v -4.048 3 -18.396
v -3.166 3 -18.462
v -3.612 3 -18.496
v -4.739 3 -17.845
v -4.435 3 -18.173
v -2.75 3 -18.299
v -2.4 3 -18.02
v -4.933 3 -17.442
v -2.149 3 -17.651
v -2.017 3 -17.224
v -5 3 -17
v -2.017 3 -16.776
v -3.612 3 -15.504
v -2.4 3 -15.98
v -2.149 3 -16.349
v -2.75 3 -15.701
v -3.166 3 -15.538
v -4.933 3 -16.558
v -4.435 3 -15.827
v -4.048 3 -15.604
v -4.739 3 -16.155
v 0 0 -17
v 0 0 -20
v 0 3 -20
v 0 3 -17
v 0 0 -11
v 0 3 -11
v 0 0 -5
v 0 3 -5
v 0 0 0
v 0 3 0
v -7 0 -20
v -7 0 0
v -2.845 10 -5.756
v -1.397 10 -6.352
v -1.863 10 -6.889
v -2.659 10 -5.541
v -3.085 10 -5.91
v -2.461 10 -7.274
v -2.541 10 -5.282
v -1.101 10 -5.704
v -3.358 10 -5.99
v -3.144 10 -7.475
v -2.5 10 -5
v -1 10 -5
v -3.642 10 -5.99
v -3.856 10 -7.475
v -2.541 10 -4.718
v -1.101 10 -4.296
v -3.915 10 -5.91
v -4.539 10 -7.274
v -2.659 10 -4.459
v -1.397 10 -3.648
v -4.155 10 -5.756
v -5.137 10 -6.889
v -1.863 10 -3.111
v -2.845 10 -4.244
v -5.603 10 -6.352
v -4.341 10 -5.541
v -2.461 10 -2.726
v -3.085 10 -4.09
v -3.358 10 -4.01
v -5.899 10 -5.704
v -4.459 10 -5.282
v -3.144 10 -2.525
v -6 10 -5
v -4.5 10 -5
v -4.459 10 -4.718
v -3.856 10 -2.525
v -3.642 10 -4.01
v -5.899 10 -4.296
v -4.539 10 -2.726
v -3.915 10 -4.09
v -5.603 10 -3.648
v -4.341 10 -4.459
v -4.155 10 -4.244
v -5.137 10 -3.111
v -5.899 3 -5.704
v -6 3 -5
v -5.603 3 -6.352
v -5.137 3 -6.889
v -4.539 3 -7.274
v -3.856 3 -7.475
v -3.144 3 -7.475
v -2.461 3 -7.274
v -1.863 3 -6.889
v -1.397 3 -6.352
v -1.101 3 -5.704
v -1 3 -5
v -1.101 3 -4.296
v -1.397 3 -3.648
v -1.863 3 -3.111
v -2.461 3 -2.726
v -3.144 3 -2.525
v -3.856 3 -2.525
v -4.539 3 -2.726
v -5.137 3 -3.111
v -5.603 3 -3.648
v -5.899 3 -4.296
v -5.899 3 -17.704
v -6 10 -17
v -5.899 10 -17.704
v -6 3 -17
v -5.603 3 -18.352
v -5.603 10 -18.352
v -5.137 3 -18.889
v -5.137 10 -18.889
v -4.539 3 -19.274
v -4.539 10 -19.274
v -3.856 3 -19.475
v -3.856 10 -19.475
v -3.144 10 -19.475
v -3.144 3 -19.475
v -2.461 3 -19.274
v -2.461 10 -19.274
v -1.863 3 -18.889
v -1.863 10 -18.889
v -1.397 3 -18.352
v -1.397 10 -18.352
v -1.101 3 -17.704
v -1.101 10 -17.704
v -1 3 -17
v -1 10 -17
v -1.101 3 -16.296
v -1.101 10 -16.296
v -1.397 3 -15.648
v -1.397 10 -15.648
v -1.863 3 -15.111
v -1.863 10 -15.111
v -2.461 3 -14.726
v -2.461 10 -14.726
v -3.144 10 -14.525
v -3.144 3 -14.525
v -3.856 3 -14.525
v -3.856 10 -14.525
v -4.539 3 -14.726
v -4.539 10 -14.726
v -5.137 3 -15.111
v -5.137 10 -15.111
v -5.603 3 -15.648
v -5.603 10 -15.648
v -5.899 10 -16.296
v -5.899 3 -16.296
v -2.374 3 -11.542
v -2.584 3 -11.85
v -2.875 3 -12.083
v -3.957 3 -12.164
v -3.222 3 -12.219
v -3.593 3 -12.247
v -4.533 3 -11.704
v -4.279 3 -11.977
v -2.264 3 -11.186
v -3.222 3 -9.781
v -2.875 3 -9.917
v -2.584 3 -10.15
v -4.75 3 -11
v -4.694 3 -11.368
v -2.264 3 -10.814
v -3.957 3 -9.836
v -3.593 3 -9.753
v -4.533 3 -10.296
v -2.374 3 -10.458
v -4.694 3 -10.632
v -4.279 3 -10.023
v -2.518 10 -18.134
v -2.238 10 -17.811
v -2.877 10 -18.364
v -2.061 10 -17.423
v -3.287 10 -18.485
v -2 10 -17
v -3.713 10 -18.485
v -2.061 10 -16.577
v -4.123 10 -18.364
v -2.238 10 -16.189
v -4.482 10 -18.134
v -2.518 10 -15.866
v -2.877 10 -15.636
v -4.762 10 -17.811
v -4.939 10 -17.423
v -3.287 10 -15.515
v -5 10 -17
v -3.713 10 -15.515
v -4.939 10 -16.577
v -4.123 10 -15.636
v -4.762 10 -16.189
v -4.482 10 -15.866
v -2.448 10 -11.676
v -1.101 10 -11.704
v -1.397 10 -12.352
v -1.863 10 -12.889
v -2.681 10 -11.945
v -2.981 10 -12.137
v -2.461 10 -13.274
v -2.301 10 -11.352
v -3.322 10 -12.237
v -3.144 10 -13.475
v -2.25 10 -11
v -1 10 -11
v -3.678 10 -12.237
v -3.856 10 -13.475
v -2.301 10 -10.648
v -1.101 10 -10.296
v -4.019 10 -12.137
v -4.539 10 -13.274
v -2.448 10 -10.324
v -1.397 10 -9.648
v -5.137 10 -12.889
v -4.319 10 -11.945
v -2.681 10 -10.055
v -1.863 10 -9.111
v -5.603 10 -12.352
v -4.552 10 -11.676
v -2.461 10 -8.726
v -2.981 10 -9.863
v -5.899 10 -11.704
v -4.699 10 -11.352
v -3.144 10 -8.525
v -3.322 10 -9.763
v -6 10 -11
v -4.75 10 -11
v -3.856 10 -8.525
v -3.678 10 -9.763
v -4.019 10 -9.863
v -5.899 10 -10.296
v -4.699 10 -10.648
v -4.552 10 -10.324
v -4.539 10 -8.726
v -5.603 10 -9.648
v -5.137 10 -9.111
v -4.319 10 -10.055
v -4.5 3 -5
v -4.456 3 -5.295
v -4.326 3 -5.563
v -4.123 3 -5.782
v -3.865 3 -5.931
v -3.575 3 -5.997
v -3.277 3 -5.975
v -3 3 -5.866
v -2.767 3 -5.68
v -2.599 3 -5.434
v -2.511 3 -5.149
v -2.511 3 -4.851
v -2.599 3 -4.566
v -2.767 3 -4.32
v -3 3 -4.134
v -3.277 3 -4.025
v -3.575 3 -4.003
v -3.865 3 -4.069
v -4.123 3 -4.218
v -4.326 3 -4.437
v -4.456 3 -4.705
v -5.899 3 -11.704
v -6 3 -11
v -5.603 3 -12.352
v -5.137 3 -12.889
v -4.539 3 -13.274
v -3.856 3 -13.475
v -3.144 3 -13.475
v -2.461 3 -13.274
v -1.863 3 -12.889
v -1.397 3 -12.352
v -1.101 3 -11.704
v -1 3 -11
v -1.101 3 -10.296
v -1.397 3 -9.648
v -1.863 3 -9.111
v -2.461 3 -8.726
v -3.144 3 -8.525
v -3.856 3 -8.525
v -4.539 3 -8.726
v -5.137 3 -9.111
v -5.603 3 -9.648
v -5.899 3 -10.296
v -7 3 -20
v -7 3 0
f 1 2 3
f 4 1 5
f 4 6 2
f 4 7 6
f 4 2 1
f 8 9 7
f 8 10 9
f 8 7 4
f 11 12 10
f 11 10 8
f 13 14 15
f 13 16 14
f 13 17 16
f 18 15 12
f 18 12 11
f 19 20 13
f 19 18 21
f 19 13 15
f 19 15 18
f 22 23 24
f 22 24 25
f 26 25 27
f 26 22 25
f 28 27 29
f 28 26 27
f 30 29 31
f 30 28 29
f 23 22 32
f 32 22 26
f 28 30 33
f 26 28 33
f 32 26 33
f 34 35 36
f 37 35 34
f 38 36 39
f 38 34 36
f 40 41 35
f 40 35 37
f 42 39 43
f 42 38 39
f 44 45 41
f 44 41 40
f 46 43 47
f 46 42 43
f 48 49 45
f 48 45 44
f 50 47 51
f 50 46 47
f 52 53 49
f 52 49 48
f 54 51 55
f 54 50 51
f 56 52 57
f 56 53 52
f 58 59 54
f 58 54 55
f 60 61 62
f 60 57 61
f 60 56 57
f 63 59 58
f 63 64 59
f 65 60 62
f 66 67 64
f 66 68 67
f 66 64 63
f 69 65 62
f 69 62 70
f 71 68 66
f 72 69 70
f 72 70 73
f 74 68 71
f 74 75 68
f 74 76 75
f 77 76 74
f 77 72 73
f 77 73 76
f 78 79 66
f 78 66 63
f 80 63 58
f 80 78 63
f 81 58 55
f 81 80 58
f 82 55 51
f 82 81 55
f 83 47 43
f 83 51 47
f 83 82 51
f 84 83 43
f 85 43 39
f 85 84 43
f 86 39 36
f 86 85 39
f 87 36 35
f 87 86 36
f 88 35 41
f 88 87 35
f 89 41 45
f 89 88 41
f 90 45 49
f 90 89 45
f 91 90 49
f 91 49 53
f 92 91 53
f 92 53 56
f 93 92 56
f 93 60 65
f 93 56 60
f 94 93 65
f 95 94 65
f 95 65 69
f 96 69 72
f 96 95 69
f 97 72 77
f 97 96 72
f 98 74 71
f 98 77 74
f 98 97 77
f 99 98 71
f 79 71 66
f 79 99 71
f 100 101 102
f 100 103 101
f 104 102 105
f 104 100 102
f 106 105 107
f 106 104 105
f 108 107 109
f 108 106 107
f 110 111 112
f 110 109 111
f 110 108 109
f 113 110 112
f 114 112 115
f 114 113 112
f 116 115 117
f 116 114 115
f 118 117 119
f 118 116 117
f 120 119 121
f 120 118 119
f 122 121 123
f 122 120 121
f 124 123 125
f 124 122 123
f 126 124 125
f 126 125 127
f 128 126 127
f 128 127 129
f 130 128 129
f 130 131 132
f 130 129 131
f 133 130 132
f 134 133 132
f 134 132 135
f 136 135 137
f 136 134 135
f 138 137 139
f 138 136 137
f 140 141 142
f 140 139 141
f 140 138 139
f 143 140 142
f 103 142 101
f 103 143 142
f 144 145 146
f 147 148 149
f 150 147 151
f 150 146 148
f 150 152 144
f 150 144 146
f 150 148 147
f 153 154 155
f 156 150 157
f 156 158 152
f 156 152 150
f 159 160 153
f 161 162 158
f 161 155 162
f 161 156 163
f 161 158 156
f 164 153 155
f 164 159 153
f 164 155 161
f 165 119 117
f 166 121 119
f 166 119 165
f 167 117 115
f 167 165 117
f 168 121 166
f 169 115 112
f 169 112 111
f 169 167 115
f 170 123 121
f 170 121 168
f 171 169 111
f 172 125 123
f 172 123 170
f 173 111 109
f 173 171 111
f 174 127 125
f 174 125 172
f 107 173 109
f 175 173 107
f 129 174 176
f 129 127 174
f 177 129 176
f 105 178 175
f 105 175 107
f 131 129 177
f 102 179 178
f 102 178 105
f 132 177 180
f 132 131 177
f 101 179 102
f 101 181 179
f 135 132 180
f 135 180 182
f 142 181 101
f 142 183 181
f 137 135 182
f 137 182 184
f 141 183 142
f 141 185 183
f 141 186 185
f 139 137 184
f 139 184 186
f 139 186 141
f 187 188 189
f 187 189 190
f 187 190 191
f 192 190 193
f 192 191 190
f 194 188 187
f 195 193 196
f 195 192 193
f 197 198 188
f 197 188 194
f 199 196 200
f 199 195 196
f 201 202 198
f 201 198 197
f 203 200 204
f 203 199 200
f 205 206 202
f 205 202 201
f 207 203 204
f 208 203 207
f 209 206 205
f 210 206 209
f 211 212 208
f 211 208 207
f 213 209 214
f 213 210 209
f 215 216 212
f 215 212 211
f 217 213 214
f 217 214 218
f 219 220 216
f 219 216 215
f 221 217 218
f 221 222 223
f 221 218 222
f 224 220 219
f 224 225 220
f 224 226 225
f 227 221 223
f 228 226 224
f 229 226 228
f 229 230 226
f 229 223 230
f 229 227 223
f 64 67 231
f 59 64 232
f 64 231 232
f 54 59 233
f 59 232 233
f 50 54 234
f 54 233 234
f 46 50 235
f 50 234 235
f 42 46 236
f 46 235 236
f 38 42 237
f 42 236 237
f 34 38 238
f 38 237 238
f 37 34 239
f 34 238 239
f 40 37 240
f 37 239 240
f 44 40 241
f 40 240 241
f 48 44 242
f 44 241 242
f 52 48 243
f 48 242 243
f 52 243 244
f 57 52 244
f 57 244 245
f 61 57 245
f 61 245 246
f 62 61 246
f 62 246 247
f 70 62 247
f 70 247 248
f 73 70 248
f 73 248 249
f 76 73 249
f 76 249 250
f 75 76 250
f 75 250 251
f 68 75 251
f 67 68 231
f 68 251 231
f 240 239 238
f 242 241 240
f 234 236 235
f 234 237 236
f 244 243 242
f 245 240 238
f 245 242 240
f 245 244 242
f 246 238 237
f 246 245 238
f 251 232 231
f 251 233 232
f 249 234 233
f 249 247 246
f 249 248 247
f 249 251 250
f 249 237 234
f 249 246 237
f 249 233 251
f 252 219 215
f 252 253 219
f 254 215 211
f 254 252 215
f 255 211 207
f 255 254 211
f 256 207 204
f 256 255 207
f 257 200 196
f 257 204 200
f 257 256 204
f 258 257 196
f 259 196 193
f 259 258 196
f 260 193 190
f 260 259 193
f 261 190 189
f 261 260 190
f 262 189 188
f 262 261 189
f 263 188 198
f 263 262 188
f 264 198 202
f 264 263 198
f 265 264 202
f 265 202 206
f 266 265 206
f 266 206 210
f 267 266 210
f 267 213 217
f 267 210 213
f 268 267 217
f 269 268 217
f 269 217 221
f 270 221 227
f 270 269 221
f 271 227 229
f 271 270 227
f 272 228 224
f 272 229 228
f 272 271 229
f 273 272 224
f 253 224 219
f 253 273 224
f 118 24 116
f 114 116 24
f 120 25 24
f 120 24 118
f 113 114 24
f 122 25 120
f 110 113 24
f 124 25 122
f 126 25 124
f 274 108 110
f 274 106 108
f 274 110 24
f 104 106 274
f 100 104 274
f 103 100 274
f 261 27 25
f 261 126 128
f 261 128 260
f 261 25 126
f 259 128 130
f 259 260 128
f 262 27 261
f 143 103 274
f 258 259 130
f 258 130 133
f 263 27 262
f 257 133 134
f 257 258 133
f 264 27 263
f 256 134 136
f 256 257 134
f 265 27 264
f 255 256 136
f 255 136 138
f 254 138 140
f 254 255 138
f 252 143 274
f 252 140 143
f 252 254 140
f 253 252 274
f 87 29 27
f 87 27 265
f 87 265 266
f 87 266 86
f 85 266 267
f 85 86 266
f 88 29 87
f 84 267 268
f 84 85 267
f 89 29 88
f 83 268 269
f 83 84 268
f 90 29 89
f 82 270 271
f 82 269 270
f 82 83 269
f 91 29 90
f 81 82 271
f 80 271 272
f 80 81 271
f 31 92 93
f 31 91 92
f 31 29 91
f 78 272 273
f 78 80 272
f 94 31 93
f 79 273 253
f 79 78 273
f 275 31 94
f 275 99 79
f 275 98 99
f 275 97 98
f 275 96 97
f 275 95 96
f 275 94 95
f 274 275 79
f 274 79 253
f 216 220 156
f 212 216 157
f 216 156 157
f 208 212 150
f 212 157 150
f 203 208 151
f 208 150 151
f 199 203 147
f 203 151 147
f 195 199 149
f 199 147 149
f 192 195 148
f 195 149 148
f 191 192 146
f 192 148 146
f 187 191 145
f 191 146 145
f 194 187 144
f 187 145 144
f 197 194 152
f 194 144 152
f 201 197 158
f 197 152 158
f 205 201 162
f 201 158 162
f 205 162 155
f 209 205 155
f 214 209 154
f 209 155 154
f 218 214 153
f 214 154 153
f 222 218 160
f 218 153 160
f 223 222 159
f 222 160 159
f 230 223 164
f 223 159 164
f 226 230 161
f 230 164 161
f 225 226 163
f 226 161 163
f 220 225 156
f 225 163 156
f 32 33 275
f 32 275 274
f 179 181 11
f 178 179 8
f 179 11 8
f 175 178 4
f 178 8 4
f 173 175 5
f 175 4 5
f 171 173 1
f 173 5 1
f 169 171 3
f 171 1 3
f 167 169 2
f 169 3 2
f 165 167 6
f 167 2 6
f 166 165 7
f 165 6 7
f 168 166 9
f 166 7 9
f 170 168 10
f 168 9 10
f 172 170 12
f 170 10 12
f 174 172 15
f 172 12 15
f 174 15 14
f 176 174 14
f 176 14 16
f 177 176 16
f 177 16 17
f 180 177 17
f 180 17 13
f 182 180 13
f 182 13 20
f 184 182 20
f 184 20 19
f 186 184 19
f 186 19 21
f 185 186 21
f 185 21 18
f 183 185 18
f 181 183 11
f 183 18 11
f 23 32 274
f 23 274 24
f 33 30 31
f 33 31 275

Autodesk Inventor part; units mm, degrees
ref_plane "YZ Plane" through (0, 0, 0) normal (1, 0, 0) x (0, 1, 0)
ref_plane "XZ Plane" through (0, 0, 0) normal (0, 1, 0) x (-1, 0, 0)
ref_plane "XY Plane" through (0, 0, 0) normal (0, 0, 1) x (1, 0, 0)
sketch "Sketch1" plane through (0, 0, 0) normal (0, 1, 0) x (-1, 0, 0)
  line L0 (0, 0) -> (7, 0)
  line L1 (7, 0) -> (7, -20)
  line L2 (7, -20) -> (0, -20)
  line L3 (0, -20) -> (0, 0)
  line L4 (0, 0) -> (0, -5)
  line L5 (0, -5) -> (3.5, -5)
  circle A0 centre (3.5, -5) radius 2.5
  circle A1 centre (3.5, -5) radius 1
  line L6 (0, -5) -> (0, -11)
  line L7 (0, -11) -> (3.5, -11)
  circle A2 centre (3.5, -11) radius 2.5
  circle A3 centre (3.5, -11) radius 1.25
  line L8 (0, -11) -> (0, -17)
  line L9 (0, -17) -> (3.5, -17)
  circle A4 centre (3.5, -17) radius 2.5
  circle A5 centre (3.5, -17) radius 1.5
  dimension "d0" = 7
  dimension "d1" = 20
  dimension "d2" = 5
  dimension "d3" = 3.5
  dimension "d4" = 5
  dimension "d5" = 2
  dimension "d6" = 6
  dimension "d7" = 3.5
  dimension "d8" = 5
  dimension "d9" = 2.5
  dimension "d10" = 6
  dimension "d11" = 3.5
  dimension "d12" = 5
  dimension "d13" = 3
extrude "Extrusion1" add sketch "Sketch1" along normal blind 3 contours L0 L1 L2 L3
extrude "Extrusion2" add sketch "Sketch1" along normal blind 3 contours A1 | A3 | A5
extrude "Extrusion3" add sketch "Sketch1" along normal blind 10 contours A0 | A2 | A4
properties part number "HoleSizeTest"
